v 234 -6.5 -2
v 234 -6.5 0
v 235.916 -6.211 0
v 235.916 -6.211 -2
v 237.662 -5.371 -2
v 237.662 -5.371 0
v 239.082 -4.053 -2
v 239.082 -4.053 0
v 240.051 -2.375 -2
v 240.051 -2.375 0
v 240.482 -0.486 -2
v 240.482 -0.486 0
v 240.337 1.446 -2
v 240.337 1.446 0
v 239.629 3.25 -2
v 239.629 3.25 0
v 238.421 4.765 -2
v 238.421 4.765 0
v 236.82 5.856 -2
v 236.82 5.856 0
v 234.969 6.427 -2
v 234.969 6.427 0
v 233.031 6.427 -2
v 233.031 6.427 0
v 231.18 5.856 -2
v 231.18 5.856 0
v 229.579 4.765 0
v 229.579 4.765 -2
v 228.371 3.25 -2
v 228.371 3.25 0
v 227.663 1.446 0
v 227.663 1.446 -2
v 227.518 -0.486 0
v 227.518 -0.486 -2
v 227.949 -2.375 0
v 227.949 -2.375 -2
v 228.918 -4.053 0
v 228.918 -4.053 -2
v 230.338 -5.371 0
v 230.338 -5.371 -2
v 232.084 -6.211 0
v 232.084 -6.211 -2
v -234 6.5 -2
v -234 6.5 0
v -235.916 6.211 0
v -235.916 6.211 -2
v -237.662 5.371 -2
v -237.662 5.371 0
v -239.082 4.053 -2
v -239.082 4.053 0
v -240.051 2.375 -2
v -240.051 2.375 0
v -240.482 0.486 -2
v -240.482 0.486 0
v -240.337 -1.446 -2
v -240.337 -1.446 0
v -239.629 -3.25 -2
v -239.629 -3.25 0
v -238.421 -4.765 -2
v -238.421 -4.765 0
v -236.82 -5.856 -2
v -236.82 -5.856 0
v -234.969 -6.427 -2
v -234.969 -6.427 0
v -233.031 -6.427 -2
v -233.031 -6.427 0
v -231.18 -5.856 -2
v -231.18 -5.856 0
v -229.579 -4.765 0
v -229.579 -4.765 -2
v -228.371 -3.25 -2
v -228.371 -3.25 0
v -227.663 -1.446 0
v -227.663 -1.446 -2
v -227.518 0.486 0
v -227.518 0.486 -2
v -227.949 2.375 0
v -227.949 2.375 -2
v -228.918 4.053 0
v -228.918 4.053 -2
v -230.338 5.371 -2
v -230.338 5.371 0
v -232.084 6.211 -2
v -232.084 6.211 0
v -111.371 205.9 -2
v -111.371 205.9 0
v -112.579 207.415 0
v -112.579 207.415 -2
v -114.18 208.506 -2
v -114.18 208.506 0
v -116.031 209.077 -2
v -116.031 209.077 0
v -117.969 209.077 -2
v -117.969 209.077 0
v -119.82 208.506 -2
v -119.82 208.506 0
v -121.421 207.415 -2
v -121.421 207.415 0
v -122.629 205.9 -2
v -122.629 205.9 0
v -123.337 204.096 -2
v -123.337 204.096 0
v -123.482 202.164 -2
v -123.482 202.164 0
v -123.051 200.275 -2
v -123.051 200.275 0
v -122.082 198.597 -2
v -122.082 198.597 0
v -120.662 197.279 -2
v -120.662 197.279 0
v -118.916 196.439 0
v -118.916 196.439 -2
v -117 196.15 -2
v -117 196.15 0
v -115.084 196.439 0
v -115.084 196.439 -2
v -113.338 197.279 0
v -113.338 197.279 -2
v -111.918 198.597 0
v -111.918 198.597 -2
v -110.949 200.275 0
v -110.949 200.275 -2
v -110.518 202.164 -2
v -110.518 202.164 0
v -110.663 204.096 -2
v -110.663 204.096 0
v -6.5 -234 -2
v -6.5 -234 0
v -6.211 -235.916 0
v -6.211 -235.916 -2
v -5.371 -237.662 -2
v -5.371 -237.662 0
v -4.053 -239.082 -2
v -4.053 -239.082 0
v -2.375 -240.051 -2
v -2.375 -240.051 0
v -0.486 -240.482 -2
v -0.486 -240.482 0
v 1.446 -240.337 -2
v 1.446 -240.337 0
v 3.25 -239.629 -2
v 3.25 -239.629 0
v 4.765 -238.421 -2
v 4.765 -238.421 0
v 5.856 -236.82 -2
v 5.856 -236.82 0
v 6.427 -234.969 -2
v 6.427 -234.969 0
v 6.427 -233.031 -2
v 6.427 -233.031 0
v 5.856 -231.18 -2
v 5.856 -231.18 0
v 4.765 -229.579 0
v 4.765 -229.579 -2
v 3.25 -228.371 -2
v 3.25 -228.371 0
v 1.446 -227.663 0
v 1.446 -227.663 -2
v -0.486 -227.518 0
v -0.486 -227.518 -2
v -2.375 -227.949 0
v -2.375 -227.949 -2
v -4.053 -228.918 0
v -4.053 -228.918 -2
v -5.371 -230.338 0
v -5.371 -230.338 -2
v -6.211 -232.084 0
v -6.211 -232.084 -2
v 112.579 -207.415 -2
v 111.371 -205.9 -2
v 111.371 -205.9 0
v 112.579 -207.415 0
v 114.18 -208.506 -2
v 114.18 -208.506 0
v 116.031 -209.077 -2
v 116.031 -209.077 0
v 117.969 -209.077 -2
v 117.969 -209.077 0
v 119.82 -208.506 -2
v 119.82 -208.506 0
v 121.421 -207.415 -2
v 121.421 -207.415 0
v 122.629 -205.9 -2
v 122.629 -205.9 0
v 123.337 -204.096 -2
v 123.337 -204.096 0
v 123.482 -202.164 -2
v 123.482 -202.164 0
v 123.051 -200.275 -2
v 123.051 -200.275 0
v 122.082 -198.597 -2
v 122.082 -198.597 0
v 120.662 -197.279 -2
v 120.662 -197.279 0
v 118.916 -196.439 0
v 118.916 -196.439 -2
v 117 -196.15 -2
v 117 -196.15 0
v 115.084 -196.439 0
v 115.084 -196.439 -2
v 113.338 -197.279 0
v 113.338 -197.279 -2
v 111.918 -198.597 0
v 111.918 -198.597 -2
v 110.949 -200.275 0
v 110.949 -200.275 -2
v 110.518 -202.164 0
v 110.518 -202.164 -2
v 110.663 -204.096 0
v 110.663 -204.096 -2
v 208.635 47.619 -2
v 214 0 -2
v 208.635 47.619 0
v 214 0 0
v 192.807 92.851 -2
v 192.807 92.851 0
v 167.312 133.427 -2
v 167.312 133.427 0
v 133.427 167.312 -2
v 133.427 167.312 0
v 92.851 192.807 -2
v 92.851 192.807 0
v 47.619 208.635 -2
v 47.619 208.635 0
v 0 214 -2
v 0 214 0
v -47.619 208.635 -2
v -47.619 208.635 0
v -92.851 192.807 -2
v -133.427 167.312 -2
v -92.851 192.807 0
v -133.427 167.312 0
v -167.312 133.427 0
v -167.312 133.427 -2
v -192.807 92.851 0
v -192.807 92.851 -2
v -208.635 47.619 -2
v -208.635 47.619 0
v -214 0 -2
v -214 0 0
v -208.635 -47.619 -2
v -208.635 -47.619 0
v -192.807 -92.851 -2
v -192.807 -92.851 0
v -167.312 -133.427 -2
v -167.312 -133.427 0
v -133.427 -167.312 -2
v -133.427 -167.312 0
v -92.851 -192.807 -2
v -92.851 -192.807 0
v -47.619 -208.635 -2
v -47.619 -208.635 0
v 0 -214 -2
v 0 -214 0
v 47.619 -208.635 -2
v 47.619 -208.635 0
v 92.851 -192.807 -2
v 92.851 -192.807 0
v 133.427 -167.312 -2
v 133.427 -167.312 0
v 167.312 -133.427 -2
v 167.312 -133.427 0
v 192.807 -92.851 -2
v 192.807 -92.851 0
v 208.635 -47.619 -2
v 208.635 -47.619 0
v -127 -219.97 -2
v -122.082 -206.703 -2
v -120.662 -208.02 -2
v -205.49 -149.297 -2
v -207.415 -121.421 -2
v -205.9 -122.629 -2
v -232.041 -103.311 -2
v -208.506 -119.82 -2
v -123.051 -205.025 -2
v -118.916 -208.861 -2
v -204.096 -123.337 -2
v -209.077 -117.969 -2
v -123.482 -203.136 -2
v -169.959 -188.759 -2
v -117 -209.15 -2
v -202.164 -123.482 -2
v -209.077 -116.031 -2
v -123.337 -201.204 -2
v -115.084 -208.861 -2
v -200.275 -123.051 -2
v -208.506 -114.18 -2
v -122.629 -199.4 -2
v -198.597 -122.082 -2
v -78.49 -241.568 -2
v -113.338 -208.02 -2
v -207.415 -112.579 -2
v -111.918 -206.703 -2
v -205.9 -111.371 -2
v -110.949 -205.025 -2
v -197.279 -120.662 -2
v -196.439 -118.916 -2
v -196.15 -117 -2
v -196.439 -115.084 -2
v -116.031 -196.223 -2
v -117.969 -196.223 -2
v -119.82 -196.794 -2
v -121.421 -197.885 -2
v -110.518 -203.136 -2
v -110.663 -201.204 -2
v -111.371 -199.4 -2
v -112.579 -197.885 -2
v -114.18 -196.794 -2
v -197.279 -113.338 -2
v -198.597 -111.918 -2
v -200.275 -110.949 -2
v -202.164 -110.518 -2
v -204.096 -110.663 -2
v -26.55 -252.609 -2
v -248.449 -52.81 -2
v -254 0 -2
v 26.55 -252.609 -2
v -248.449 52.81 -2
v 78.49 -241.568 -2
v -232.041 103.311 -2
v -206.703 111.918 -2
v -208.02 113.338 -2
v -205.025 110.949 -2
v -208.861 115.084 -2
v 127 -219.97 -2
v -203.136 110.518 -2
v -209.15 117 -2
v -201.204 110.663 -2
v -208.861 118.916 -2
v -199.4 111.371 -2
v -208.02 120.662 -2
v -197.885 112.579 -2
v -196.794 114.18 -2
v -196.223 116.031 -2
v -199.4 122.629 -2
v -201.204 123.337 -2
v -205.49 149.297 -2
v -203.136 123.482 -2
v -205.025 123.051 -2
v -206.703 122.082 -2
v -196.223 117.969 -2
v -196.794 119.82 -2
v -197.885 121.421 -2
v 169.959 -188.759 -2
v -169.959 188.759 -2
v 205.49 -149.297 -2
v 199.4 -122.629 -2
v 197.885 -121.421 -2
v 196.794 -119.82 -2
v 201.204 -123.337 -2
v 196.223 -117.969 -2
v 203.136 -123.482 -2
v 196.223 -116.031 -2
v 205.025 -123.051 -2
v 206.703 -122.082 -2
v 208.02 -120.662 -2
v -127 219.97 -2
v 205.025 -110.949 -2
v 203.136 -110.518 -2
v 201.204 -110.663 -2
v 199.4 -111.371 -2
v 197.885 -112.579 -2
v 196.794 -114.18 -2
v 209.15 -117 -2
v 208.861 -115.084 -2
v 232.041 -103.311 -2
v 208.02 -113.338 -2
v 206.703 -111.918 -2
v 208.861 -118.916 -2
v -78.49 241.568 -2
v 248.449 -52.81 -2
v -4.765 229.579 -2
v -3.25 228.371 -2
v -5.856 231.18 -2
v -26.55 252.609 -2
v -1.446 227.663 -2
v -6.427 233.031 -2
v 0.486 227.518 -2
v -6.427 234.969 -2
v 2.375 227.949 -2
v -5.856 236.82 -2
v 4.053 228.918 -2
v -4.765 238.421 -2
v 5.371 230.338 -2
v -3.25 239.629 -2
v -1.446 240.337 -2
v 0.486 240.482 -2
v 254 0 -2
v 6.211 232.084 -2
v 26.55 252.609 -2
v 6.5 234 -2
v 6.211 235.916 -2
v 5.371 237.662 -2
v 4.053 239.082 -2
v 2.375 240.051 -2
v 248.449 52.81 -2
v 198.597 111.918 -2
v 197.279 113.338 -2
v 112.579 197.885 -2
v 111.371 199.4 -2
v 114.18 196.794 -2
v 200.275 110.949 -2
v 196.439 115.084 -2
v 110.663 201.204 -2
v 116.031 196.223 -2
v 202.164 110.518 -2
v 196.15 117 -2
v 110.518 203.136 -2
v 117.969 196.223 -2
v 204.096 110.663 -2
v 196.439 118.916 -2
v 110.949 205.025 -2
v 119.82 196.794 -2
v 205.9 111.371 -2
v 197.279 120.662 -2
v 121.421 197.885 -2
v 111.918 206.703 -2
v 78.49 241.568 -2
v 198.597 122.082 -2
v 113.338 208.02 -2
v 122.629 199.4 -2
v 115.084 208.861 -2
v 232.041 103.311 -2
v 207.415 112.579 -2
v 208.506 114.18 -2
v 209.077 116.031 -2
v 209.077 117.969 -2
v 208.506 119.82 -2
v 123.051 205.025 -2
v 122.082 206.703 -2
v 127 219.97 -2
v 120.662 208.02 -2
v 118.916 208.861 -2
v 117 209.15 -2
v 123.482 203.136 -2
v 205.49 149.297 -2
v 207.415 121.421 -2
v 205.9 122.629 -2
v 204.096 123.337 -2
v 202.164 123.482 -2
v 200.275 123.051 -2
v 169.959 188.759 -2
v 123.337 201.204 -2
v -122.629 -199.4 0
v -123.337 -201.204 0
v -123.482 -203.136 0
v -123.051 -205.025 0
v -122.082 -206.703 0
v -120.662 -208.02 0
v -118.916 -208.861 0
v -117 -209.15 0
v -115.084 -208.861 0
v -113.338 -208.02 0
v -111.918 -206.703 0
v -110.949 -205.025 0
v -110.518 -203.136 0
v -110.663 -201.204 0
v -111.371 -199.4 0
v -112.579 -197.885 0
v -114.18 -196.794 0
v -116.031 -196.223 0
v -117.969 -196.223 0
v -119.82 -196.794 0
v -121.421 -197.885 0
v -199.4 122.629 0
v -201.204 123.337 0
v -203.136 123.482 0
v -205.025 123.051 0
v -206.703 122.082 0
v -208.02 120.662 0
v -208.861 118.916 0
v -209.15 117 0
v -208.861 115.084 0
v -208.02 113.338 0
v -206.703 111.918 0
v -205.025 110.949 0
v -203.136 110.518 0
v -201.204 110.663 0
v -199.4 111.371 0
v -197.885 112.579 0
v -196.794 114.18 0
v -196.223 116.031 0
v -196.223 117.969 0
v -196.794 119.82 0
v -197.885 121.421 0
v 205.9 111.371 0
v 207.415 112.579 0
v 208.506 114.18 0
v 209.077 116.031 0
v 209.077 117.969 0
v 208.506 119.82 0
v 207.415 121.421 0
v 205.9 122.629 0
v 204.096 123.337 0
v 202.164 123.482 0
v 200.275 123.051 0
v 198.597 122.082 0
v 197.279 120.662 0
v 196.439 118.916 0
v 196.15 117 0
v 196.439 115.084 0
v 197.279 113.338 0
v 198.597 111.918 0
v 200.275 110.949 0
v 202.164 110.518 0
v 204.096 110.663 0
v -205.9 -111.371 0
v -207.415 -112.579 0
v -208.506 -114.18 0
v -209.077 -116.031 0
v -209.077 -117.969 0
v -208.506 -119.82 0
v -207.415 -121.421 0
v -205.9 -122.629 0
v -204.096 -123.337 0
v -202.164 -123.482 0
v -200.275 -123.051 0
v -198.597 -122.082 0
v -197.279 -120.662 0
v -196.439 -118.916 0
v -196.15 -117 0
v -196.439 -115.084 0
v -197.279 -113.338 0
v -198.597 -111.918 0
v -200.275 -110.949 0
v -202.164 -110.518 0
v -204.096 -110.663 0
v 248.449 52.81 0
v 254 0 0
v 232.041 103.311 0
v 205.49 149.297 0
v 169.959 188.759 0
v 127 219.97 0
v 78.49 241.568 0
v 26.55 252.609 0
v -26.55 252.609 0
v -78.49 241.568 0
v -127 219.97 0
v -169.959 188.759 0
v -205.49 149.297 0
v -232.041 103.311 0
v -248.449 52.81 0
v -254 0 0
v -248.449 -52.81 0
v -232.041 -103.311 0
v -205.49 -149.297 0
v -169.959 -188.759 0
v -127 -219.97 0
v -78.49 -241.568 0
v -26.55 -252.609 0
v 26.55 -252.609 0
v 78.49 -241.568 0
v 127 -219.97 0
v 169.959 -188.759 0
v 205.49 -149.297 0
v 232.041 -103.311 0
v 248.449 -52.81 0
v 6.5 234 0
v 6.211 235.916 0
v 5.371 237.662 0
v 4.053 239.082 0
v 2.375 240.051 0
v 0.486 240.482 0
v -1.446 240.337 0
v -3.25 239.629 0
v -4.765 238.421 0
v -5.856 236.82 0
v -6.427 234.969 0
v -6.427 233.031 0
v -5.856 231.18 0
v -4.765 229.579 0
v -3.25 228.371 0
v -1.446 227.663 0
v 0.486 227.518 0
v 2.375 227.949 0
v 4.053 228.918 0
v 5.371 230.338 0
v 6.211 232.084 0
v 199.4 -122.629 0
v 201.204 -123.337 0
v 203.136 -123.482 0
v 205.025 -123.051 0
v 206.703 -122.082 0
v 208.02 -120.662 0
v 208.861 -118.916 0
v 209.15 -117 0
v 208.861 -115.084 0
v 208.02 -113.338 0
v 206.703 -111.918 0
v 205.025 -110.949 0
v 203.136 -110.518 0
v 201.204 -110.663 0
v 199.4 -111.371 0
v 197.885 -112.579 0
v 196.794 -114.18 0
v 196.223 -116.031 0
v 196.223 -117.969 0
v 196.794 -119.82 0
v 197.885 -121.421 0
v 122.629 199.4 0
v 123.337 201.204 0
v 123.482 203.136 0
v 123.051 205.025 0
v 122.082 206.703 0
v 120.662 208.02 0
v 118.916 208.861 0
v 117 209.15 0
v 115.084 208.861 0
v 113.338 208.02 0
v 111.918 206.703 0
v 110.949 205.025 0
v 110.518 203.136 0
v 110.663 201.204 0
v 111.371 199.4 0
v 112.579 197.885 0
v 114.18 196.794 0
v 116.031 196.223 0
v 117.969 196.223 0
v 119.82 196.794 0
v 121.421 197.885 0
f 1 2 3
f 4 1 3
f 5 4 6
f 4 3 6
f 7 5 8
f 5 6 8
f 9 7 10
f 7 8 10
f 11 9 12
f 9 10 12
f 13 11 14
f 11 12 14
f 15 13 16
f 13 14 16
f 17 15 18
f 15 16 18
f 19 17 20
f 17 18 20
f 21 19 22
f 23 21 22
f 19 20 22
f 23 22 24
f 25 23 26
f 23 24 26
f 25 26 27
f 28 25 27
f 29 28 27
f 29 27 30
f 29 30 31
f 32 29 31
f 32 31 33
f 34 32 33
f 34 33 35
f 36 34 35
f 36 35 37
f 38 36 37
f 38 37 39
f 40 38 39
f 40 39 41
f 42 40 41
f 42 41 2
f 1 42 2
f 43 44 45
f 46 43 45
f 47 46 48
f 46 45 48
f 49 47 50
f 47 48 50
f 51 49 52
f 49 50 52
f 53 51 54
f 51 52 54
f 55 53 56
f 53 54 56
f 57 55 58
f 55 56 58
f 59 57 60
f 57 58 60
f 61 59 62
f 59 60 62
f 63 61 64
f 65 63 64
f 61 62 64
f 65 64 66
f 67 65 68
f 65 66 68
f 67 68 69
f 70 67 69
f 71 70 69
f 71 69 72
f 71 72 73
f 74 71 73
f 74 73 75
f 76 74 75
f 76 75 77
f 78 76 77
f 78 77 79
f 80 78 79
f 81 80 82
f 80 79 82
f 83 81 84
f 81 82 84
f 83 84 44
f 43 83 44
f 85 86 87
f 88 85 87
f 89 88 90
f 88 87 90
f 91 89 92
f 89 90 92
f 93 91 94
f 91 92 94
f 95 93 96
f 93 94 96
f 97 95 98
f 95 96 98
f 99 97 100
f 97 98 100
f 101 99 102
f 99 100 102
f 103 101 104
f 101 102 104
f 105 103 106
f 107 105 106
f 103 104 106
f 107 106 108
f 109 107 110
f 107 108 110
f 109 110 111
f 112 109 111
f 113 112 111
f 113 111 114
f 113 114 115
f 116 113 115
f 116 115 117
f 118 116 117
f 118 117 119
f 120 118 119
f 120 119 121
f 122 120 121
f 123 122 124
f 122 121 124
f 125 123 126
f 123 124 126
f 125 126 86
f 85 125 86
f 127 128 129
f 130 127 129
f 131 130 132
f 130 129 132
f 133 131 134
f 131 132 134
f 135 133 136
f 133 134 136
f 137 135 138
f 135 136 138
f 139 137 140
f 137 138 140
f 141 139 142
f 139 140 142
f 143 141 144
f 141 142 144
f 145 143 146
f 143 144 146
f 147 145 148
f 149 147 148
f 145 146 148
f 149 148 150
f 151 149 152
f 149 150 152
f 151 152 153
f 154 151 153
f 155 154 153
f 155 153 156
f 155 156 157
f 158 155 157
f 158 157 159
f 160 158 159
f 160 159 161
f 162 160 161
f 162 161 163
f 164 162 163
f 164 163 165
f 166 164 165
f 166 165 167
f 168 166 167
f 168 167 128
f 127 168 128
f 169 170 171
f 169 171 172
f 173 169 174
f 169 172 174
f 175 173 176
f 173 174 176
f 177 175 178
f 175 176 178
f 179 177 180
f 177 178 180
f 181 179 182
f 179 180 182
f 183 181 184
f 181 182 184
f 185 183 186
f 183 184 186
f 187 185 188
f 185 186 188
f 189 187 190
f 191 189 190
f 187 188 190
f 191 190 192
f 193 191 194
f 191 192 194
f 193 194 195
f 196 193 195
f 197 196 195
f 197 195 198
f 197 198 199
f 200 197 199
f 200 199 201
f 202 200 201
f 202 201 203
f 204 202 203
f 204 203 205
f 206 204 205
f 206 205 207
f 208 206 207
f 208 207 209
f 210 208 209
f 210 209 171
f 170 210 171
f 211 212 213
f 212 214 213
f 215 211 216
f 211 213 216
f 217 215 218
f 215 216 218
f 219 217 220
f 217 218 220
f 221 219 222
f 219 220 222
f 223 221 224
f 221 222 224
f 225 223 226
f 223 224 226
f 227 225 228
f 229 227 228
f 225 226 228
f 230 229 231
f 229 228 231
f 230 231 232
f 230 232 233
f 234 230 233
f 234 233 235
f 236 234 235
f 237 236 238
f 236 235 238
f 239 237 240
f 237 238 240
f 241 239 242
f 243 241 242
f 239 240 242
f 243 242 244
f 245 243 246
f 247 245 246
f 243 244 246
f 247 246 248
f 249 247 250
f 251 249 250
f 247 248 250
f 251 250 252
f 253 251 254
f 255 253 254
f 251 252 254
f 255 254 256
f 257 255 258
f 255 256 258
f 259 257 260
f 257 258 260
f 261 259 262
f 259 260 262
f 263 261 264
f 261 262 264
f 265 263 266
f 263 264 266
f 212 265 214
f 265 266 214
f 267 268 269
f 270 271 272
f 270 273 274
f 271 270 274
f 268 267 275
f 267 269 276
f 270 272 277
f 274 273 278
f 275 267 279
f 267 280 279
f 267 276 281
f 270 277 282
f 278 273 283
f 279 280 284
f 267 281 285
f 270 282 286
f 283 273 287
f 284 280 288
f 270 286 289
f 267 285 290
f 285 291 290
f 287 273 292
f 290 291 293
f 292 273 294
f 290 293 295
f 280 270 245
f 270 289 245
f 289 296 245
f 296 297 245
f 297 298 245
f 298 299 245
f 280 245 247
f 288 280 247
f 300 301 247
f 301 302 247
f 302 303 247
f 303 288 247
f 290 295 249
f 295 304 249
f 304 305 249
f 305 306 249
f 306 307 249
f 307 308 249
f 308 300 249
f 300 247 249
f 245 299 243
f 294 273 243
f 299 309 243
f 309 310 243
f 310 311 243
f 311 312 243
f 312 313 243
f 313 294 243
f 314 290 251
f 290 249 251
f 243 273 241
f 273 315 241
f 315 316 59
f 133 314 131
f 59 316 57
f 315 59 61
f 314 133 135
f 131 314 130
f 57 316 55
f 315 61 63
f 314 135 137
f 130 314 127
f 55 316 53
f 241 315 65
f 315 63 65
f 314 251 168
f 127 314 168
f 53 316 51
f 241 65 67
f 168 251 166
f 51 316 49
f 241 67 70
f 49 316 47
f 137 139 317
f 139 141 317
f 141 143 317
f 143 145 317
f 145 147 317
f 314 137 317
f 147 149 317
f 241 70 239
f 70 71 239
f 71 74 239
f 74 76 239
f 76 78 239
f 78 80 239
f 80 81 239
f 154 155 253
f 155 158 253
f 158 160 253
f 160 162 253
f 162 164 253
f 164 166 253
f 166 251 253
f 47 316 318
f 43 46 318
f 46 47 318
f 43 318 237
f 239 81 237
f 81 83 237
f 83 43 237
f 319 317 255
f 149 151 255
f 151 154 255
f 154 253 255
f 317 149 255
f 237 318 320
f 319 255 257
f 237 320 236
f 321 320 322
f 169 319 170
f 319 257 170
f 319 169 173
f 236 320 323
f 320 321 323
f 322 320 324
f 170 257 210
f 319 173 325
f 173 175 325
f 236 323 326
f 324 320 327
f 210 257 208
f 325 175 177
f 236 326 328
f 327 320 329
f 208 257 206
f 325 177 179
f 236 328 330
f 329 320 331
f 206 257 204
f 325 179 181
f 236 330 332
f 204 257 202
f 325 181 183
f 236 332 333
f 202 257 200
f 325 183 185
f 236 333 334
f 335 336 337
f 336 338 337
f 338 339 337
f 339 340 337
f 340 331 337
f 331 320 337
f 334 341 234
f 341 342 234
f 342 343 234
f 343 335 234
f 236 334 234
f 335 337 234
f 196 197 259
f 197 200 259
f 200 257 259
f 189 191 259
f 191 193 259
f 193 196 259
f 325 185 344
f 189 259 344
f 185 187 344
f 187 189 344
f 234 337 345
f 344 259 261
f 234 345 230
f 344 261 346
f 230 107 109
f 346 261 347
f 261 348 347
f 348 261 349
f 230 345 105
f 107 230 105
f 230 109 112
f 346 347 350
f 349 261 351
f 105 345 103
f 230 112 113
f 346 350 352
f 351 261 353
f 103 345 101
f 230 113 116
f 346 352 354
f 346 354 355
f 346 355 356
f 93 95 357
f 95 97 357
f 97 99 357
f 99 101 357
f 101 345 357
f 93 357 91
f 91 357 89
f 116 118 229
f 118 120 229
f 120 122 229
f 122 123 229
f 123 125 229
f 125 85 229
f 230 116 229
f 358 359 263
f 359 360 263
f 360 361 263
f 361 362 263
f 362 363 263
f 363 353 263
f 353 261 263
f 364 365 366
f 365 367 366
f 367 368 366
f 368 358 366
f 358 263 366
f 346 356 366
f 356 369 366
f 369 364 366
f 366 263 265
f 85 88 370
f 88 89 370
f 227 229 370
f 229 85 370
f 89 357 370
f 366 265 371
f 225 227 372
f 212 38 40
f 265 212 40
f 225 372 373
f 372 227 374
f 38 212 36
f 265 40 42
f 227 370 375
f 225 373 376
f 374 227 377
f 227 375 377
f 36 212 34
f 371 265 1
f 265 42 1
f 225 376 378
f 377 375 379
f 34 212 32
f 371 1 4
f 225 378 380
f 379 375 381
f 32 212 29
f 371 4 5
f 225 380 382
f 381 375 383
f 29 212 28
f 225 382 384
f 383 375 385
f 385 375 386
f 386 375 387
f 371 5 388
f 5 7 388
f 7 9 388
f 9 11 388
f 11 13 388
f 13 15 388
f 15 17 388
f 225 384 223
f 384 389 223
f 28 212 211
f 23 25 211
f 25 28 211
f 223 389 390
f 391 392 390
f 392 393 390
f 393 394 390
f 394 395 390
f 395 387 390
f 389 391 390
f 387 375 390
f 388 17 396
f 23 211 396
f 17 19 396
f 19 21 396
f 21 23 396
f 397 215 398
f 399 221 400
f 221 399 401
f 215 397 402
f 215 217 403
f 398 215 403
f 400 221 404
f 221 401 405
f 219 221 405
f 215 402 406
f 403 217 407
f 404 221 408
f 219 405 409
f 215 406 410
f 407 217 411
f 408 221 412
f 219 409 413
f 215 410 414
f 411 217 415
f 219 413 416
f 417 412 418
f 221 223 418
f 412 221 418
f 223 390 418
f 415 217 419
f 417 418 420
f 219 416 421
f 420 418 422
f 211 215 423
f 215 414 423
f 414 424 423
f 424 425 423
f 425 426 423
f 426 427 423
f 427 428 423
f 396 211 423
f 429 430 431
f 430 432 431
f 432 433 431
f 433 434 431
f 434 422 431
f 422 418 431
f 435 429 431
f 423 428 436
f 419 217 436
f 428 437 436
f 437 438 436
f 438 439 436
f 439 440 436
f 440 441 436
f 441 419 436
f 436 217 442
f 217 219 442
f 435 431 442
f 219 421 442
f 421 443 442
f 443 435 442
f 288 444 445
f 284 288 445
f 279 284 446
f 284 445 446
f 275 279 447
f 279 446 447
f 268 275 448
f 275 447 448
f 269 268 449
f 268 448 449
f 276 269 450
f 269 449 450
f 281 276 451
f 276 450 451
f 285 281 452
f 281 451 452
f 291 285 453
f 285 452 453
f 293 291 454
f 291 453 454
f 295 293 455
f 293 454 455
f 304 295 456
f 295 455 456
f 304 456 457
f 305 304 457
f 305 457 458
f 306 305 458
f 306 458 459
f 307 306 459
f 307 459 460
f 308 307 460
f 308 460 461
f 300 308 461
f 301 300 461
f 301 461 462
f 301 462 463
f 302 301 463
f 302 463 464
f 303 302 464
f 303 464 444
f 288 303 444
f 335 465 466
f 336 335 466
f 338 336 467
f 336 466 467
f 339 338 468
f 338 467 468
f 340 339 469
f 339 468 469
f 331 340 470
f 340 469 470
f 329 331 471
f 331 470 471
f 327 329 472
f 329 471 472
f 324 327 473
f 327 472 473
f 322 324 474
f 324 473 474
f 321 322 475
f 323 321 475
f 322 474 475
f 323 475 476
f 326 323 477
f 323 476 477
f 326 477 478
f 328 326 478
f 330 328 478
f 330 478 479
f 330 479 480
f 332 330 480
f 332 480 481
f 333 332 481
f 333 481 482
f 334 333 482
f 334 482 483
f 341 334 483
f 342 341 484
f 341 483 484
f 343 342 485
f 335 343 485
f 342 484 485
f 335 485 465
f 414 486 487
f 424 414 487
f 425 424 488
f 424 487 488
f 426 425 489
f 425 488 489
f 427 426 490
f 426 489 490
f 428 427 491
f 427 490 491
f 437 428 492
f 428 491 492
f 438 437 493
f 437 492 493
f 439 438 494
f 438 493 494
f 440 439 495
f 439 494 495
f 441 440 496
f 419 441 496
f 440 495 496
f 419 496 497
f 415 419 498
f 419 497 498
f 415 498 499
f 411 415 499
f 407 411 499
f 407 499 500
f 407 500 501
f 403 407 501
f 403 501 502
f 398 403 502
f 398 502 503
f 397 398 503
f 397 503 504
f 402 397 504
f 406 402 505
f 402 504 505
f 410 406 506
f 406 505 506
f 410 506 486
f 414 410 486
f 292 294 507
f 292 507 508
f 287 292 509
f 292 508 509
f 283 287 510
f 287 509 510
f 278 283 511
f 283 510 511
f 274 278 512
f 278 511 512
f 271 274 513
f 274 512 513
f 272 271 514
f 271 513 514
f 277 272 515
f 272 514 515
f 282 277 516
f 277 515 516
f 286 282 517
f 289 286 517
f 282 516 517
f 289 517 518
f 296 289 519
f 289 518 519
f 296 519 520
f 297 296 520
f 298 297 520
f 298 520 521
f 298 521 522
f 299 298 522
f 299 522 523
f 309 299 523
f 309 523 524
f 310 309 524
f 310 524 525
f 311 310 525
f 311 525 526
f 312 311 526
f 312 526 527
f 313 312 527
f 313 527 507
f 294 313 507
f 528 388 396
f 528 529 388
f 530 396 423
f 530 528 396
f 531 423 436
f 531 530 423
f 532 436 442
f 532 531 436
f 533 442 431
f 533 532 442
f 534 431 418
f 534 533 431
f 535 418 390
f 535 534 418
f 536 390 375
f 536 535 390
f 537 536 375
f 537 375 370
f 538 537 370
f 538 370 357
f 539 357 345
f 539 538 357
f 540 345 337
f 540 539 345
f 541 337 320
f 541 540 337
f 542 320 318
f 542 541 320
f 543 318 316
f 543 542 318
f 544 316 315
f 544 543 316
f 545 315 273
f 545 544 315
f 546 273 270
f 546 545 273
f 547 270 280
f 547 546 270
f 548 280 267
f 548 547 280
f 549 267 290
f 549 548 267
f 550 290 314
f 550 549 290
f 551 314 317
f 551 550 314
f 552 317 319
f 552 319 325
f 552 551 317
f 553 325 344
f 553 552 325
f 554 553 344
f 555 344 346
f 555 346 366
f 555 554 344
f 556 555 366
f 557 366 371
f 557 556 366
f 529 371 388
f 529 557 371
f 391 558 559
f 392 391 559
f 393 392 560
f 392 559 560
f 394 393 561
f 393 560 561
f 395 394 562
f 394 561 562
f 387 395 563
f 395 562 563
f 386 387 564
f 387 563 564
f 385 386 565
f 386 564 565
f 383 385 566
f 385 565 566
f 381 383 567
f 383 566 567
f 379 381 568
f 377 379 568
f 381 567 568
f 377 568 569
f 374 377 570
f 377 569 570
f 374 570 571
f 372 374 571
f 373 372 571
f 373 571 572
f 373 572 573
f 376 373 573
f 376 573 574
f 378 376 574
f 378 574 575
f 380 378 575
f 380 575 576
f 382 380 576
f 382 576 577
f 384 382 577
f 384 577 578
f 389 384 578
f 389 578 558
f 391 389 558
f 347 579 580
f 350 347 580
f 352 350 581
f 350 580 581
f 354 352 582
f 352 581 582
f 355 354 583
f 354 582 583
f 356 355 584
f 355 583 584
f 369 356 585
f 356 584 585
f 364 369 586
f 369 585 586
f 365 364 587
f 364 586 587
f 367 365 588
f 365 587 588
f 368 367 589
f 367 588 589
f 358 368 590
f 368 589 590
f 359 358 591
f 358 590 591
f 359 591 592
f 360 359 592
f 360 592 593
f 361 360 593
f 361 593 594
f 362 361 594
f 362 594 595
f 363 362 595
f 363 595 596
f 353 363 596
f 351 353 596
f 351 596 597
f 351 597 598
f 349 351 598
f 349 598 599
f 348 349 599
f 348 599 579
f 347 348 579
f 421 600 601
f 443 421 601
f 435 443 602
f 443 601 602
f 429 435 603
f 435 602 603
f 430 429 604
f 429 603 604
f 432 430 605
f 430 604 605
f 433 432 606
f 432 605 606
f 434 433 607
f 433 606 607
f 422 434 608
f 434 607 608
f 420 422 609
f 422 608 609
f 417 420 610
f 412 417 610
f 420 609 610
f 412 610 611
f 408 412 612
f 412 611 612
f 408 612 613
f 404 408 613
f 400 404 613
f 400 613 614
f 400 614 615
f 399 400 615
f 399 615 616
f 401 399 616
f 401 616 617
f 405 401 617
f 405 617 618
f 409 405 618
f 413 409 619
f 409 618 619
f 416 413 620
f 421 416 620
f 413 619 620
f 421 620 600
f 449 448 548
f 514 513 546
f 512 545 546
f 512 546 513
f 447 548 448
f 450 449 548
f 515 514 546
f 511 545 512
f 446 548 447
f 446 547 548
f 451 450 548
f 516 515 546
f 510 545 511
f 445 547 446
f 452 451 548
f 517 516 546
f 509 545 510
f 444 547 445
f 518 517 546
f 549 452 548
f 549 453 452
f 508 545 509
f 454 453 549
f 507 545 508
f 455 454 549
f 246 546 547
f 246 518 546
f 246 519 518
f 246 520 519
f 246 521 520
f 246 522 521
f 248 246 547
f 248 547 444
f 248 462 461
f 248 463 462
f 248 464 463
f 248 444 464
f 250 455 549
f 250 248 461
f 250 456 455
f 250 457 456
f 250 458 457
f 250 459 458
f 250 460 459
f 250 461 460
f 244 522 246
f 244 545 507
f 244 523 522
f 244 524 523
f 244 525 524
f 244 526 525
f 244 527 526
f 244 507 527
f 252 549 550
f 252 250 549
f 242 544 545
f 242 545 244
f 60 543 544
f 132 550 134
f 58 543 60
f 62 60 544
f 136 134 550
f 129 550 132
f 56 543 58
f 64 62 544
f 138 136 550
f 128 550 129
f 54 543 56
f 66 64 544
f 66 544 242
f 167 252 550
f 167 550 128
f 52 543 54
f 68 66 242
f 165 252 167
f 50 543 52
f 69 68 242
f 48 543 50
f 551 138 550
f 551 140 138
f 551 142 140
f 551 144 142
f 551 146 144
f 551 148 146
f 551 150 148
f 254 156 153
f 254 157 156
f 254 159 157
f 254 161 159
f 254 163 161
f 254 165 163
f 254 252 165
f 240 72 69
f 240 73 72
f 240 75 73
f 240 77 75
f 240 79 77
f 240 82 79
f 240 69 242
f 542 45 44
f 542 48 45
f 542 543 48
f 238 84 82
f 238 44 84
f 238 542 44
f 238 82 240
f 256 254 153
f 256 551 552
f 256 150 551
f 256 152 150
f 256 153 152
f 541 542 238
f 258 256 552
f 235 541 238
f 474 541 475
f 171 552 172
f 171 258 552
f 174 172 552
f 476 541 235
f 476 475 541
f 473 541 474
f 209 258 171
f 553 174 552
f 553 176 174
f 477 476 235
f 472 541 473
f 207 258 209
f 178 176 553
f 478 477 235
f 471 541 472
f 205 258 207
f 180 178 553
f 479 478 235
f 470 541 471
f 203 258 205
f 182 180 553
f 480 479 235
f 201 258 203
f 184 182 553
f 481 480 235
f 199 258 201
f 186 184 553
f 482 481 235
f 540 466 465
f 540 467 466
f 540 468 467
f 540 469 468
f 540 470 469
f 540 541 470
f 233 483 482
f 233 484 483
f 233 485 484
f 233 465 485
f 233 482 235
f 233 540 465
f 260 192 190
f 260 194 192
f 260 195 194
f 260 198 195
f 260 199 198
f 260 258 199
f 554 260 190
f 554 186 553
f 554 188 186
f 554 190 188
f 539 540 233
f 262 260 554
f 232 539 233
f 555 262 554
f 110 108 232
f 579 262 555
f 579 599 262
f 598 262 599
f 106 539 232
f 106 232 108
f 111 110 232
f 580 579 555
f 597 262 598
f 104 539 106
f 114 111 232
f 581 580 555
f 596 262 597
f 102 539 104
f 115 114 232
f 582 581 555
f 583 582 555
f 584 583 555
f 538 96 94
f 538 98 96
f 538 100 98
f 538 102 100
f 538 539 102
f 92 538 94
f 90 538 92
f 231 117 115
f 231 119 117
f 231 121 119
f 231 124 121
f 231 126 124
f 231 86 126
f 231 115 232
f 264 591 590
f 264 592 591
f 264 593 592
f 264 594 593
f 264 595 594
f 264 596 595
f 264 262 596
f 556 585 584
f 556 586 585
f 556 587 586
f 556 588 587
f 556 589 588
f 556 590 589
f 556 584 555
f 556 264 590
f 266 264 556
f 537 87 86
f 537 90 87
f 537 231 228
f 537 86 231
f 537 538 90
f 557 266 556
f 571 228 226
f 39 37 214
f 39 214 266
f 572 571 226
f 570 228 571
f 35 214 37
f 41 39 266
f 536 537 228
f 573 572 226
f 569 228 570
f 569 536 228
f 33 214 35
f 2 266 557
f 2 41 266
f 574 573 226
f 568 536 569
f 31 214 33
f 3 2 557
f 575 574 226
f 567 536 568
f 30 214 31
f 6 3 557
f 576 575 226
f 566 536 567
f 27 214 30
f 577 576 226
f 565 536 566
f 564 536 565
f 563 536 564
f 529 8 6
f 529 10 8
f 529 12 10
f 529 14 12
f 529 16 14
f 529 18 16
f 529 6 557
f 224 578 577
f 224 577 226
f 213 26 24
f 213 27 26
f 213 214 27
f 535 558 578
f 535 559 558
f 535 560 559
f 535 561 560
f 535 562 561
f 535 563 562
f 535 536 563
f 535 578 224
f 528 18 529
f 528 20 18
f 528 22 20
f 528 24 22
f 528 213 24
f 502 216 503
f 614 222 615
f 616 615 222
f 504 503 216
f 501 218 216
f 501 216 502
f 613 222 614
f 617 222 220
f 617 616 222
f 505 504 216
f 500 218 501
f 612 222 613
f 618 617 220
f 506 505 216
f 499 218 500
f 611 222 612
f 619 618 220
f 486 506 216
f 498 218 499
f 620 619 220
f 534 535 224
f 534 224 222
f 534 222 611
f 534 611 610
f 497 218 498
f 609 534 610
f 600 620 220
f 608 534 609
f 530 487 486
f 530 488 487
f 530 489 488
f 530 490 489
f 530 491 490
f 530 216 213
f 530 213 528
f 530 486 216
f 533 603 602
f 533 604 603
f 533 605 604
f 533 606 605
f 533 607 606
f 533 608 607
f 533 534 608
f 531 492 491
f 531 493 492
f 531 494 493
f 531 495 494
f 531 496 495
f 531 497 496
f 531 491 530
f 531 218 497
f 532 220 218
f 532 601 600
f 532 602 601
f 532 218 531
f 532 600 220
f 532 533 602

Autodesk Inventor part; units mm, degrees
ref_plane "YZ Plane" through (0, 0, 0) normal (1, 0, 0) x (0, 1, 0)
ref_plane "XZ Plane" through (0, 0, 0) normal (0, 1, 0) x (-1, 0, 0)
ref_plane "XY Plane" through (0, 0, 0) normal (0, 0, 1) x (1, 0, 0)
sketch "Sketch1" plane through (0, 0, 0) normal (0, 0, 1) x (1, 0, 0)
  circle A0 centre (0, 0) radius 214
  circle A1 centre (0, 0) radius 254
  dimension "d31" = 508
  dimension "d32" = 428
extrude "Plate1" add sketch "Sketch1" against normal blind 2
sketch "Sketch2" plane through (0, 0, 0) normal (0, 0, 1) x (1, 0, 0)
  circle A0 centre (0, 0) radius 214 construction
  circle A1 centre (0, 0) radius 254 construction
  line L0 (0, 254) -> (0, 214) construction
  circle A2 centre (0, 234) radius 6.5
  dimension "d33" = 13
extrude "Cut1" cut sketch "Sketch2" against normal blind 2
pattern_circular "Circular Pattern1" count 12 over 360 about axis through (0, 0, 0) along (0, 0, -1) of "Cut1"
equation "\"d31\" = Колесо_диам3_борт_ступицы"
equation "\"d32\" = Колесо_диам4_дно_ступицы"
equation "\"d34\" = Thickness"
equation "\"d15\" = Thickness"
equation "\"BendRadius\" = Thickness"
equation "\"BendReliefWidth\" = Thickness"
equation "\"BendReliefDepth\" = 0.5 * Thickness"
equation "\"CornerReliefSize\" = 4 * Thickness"
equation "\"MinimumRemnant\" = 2 * Thickness"
equation "\"TransitionRadius\" = BendRadius"
equation "\"JacobiRadiusSize\" = BendRadius"
equation "\"GapSize\" = Thickness"
equation "\"Колесо_диам3_борт_ступицы\" = 508"
equation "\"Колесо_диам4_дно_ступицы\" = 428"
equation "\"Thickness\" = 2"
properties part number "DMF2.0 01 45 Gear ring 5"
